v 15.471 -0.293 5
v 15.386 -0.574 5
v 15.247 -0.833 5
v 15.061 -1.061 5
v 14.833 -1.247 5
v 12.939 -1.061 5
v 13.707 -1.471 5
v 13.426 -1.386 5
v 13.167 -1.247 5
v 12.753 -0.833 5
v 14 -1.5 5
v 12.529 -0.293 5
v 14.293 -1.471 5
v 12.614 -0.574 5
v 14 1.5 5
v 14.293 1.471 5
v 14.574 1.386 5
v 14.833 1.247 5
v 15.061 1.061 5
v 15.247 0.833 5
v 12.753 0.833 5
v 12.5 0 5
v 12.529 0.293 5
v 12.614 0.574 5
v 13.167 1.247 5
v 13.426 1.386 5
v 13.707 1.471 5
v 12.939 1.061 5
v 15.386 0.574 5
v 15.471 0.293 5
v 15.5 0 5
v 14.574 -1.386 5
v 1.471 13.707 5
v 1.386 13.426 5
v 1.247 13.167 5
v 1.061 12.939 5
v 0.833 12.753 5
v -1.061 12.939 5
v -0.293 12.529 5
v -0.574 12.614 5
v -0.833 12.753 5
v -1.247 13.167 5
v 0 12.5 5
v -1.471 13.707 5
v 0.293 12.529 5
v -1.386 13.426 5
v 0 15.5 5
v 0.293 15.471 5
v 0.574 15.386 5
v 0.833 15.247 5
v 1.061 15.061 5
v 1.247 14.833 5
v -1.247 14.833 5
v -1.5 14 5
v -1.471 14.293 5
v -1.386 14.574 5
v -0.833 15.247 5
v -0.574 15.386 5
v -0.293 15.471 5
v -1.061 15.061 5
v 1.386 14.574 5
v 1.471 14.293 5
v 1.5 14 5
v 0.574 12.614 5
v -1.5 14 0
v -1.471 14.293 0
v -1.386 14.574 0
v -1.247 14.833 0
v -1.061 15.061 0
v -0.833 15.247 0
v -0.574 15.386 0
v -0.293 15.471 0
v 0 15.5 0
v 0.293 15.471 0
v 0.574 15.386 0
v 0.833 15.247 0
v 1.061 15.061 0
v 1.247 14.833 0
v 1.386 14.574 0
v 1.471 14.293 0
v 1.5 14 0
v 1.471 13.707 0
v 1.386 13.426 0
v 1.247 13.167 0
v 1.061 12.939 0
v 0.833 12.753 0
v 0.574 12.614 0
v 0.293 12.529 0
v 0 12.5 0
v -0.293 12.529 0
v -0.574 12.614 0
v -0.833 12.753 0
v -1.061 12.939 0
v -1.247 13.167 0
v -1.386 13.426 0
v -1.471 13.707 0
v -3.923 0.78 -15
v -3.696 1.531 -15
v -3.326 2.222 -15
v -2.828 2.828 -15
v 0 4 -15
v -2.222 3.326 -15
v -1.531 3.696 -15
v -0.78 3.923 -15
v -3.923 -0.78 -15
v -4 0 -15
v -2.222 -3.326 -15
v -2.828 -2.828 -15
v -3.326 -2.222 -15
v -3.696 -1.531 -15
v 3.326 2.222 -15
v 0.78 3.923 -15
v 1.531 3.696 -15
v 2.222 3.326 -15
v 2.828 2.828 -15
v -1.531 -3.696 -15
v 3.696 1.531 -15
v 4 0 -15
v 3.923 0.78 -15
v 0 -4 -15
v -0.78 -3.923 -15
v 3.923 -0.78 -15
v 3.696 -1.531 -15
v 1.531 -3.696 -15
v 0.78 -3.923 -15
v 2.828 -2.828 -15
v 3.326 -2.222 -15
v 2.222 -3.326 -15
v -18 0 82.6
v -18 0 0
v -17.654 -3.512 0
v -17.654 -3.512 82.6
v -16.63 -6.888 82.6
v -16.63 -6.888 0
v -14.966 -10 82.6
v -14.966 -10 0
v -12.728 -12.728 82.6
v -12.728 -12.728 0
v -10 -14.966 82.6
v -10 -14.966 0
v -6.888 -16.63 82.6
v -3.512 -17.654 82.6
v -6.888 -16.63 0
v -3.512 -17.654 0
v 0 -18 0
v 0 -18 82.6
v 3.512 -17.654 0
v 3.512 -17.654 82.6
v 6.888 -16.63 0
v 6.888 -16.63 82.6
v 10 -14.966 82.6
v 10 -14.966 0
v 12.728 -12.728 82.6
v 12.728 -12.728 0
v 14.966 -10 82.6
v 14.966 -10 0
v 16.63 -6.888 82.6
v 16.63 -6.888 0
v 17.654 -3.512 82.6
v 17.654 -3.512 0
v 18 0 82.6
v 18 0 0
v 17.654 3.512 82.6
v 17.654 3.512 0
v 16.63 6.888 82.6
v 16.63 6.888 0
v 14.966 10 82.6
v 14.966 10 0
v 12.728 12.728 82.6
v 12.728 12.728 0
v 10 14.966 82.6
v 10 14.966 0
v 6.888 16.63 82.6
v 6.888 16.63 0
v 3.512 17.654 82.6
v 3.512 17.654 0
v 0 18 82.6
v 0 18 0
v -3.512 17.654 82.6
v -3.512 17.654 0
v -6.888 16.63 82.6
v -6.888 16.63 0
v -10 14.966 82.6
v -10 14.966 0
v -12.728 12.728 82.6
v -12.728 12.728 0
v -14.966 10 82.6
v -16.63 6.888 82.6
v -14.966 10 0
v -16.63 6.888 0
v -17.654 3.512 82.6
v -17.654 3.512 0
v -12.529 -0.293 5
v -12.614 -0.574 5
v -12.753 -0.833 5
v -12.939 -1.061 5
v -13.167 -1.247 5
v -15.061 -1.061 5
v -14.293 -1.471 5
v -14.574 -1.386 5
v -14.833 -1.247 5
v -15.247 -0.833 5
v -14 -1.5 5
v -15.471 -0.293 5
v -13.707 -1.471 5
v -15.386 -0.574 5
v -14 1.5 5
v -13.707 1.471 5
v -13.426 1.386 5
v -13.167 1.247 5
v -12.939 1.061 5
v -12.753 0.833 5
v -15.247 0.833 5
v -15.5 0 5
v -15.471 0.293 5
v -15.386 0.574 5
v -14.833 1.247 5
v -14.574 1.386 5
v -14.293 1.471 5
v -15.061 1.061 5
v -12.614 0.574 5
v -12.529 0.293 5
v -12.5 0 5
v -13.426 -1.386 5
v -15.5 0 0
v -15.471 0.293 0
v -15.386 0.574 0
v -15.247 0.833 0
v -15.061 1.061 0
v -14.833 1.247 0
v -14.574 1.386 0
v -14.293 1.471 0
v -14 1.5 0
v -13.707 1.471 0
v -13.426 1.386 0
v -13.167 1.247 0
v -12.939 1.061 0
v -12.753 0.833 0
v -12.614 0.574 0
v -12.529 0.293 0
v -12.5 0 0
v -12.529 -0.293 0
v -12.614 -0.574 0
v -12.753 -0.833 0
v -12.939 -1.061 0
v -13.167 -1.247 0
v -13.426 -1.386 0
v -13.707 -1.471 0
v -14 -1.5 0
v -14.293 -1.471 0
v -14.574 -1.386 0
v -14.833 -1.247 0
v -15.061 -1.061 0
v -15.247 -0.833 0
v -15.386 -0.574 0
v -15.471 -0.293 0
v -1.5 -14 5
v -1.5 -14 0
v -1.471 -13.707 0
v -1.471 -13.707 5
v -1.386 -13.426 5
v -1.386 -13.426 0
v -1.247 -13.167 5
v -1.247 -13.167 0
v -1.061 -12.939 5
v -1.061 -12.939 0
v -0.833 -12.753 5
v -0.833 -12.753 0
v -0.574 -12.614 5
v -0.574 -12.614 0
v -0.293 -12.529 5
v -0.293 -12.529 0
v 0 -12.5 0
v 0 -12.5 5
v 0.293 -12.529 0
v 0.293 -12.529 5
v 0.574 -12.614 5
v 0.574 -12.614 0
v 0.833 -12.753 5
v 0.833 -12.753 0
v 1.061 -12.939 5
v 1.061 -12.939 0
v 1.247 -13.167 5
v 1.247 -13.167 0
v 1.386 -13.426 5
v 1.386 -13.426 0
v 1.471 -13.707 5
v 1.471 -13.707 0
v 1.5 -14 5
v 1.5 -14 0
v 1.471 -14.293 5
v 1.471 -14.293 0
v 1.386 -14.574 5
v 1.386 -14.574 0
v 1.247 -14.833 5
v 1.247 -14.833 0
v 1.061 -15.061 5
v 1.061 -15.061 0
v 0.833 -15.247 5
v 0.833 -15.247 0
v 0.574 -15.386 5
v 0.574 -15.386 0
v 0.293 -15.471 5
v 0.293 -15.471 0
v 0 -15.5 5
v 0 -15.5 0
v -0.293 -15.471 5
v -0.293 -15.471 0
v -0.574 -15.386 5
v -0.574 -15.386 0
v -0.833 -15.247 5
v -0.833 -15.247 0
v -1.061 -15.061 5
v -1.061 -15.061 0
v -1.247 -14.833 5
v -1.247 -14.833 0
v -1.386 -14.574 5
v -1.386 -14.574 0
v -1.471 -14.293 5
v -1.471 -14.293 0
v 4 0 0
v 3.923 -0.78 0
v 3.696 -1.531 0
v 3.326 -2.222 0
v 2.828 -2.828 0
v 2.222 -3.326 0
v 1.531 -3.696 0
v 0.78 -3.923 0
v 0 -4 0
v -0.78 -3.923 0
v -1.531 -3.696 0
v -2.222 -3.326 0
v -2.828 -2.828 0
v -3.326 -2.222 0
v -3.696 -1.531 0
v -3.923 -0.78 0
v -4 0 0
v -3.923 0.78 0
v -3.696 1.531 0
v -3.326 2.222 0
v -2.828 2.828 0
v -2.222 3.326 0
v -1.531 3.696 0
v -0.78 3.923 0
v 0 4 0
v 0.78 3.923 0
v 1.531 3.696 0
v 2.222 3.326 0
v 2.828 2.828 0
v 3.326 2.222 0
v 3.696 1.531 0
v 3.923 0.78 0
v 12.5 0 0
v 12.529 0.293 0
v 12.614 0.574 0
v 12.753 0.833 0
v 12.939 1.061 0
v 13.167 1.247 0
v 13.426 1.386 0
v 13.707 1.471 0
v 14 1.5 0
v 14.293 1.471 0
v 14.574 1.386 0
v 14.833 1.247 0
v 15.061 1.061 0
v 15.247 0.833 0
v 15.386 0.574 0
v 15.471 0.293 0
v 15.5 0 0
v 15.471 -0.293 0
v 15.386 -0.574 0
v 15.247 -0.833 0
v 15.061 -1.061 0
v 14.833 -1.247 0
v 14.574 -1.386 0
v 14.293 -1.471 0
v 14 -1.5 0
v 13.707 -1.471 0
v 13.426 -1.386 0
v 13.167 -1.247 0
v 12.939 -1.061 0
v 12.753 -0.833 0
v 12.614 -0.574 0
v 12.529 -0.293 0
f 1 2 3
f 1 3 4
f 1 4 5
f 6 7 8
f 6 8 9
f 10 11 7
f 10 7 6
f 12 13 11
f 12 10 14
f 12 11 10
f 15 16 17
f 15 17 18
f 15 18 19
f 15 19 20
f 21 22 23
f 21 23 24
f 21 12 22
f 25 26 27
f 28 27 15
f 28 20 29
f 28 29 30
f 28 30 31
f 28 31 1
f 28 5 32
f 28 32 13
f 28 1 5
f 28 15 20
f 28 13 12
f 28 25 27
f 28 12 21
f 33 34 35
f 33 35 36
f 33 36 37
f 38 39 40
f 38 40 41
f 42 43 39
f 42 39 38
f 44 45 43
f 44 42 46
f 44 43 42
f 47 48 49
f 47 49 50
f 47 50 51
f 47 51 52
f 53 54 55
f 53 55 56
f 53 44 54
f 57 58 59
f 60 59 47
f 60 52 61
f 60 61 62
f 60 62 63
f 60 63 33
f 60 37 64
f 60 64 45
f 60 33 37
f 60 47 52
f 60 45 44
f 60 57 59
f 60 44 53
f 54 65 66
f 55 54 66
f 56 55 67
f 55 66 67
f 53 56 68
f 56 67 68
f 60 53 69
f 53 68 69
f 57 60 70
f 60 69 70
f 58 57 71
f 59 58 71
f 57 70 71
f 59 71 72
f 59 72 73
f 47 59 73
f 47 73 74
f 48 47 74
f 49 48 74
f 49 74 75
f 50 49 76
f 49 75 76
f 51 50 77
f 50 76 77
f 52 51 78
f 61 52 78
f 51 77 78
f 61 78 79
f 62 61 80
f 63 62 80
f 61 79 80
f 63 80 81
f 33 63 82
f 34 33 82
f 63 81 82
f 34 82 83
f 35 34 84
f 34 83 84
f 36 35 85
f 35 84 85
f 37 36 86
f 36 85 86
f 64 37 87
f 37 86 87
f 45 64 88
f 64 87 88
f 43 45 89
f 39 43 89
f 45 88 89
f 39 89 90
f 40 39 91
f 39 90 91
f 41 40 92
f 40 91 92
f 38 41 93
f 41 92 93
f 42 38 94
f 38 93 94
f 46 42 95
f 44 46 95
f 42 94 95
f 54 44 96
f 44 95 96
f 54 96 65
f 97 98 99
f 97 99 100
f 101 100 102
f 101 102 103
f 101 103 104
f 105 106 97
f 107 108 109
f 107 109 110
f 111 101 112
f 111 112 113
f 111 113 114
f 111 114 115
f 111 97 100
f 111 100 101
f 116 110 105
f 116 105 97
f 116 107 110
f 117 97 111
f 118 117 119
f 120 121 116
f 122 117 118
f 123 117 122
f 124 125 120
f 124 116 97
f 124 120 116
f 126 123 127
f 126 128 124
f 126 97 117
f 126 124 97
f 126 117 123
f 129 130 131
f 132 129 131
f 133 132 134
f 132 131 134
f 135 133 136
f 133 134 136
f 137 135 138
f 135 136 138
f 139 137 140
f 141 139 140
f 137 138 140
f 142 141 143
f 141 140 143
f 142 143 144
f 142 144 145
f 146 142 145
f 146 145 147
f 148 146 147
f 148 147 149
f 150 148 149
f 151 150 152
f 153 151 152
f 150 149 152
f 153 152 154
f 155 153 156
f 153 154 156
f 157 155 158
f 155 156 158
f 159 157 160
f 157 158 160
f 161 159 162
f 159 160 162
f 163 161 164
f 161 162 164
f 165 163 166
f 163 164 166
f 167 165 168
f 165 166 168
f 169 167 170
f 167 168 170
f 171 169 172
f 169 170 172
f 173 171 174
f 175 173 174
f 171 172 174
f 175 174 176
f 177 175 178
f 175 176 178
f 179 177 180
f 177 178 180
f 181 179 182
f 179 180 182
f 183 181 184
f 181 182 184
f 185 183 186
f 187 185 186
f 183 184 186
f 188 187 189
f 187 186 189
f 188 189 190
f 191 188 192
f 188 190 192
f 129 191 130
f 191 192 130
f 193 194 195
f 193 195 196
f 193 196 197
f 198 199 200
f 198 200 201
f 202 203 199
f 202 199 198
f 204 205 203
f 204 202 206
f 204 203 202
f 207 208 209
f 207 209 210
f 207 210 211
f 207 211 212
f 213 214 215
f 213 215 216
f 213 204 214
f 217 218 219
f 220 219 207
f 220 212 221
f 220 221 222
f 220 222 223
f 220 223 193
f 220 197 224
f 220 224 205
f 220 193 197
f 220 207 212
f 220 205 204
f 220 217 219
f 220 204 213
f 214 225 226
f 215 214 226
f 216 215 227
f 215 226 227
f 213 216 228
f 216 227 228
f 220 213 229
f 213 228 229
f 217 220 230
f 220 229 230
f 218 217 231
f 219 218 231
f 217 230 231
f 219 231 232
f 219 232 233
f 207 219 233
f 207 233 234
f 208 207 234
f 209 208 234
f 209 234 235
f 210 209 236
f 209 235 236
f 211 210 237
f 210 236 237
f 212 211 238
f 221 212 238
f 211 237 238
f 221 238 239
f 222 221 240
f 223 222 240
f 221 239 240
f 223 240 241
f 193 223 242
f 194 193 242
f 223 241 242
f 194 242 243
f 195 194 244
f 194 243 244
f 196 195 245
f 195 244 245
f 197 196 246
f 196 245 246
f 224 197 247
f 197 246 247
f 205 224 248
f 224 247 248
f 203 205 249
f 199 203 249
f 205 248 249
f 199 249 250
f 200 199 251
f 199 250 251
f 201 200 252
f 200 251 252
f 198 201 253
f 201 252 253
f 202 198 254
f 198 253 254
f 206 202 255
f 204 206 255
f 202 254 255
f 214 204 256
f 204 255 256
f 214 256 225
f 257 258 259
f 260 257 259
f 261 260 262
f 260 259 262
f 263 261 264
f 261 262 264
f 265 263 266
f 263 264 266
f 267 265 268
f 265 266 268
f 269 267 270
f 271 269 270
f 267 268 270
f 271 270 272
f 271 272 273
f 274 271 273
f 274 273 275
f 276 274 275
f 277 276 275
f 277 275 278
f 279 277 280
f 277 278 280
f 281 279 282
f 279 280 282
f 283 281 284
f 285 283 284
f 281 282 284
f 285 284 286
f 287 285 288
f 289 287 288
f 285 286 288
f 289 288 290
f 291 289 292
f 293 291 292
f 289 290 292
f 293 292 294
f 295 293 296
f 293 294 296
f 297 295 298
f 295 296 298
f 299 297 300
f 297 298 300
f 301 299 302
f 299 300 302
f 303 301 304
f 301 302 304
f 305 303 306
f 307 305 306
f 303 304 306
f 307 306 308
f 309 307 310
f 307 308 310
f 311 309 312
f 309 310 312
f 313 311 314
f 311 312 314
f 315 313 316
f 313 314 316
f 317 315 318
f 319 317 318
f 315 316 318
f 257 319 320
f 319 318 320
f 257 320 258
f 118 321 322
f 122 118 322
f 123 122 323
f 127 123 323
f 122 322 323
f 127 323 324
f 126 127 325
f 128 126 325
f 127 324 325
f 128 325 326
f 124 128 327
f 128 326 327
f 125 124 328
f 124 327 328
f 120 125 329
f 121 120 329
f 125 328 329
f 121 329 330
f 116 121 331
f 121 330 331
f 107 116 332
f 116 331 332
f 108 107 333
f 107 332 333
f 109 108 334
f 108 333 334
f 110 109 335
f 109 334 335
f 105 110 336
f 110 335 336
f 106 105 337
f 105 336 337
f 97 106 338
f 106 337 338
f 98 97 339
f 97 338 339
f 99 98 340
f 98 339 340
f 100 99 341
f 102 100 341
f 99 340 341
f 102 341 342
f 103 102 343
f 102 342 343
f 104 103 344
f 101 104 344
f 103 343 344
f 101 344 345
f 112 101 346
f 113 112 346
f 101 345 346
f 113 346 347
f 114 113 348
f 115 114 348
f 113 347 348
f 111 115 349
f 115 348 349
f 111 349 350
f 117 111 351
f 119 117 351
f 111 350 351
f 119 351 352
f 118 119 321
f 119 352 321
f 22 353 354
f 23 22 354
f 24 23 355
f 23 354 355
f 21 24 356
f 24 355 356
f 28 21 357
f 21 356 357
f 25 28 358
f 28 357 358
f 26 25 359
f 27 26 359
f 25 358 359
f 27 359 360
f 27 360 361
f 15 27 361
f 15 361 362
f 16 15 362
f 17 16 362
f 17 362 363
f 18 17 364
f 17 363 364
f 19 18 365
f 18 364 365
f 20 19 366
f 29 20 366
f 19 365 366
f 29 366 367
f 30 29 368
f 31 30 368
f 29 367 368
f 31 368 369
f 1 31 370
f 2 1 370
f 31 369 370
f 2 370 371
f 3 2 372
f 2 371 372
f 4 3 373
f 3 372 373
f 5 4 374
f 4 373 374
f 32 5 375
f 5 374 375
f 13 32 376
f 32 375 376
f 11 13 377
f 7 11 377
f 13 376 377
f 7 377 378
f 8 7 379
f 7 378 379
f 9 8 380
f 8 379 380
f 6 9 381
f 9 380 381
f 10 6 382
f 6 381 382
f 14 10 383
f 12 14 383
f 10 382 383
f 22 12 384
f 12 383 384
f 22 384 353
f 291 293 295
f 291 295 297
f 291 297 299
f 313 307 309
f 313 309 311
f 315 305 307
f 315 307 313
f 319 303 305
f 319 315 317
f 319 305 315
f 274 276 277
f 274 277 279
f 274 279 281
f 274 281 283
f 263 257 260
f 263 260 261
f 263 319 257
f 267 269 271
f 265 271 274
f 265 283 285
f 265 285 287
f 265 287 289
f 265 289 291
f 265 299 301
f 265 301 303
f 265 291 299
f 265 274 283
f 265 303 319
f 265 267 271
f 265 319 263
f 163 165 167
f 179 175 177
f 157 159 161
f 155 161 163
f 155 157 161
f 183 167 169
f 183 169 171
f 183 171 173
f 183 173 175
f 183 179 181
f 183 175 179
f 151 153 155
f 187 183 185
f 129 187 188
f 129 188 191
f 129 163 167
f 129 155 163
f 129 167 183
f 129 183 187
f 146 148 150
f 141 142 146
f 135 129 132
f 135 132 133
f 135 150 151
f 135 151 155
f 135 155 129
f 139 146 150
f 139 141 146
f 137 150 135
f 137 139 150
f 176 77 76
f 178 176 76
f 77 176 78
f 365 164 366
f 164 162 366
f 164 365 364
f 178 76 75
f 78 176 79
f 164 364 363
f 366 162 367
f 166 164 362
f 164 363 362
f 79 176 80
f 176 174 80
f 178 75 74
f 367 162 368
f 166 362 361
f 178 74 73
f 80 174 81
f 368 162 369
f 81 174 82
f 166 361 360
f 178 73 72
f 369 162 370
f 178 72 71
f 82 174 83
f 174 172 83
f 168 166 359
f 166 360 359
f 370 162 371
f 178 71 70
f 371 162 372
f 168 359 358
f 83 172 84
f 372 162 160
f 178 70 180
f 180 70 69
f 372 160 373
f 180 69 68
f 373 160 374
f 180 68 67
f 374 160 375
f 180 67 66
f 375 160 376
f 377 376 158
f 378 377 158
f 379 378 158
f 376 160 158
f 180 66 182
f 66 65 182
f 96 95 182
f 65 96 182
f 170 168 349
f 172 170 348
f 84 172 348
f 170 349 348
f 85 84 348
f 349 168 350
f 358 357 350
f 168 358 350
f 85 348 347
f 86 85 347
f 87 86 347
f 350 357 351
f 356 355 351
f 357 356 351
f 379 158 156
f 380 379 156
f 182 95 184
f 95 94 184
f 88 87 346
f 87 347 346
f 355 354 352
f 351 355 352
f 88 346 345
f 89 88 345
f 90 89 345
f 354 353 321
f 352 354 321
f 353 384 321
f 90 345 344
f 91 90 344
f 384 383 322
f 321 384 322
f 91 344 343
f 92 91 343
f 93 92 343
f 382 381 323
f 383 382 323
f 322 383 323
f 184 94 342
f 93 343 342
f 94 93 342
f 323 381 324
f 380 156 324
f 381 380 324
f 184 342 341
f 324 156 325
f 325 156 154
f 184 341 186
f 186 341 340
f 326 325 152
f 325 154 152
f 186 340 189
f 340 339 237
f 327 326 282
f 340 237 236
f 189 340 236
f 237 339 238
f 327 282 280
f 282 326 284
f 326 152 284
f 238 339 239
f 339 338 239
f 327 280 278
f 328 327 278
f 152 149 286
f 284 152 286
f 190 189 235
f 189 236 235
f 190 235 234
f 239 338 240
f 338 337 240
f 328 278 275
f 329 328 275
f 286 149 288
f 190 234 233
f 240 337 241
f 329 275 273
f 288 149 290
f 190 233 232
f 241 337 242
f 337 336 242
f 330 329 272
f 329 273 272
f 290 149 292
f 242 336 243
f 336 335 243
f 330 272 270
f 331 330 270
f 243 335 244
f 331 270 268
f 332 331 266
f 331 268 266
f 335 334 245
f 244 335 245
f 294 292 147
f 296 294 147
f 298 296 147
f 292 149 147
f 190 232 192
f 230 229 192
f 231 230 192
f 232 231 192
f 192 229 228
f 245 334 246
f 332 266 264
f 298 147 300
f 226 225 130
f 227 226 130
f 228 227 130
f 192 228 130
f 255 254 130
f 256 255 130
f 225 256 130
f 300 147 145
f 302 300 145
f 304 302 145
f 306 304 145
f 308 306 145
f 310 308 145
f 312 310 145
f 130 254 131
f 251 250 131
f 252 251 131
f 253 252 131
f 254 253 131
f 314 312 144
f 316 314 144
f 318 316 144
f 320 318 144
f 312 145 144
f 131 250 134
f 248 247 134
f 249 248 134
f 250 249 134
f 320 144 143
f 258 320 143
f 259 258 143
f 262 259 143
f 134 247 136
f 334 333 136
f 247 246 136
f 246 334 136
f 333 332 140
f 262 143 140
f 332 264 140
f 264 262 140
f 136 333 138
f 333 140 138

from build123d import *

# Parameters (mm, degrees)
SKETCH1_R           = 18
BOSS_EXTRUDE1_DEPTH = 82.6
SKETCH3_R           = 1.5
CUT_EXTRUDE1_DEPTH  = 5
SKETCH2_R           = 4
BOSS_EXTRUDE3_DEPTH = 15


with BuildPart() as part:
    # Sketch1 → Boss-Extrude1 (new body)
    with BuildSketch(Plane.XY):
        with Locations(Location((0, 0, 0), (0, 0, 180))):
            Circle(SKETCH1_R)
    extrude(amount=BOSS_EXTRUDE1_DEPTH)

    # Sketch3 → Cut-Extrude1 (cut)
    with BuildSketch(Plane(origin=(0, 0, 0), x_dir=(-1, 0, 0), z_dir=(0, 0, -1))):
        with Locations((0, 14)):
            Circle(SKETCH3_R)
        with Locations((14, 0)):
            Circle(SKETCH3_R)
        with Locations((0, -14)):
            Circle(SKETCH3_R)
        with Locations((-14, 0)):
            Circle(SKETCH3_R)
    extrude(amount=-CUT_EXTRUDE1_DEPTH, mode=Mode.SUBTRACT)

    # Sketch2 → Boss-Extrude3 (add)
    with BuildSketch(Plane(origin=(0, 0, 0), x_dir=(-1, 0, 0), z_dir=(0, 0, -1))):
        with Locations(Location((0, 0, 0), (0, 0, 180))):
            Circle(SKETCH2_R)
    extrude(amount=BOSS_EXTRUDE3_DEPTH)


solid = part.part
